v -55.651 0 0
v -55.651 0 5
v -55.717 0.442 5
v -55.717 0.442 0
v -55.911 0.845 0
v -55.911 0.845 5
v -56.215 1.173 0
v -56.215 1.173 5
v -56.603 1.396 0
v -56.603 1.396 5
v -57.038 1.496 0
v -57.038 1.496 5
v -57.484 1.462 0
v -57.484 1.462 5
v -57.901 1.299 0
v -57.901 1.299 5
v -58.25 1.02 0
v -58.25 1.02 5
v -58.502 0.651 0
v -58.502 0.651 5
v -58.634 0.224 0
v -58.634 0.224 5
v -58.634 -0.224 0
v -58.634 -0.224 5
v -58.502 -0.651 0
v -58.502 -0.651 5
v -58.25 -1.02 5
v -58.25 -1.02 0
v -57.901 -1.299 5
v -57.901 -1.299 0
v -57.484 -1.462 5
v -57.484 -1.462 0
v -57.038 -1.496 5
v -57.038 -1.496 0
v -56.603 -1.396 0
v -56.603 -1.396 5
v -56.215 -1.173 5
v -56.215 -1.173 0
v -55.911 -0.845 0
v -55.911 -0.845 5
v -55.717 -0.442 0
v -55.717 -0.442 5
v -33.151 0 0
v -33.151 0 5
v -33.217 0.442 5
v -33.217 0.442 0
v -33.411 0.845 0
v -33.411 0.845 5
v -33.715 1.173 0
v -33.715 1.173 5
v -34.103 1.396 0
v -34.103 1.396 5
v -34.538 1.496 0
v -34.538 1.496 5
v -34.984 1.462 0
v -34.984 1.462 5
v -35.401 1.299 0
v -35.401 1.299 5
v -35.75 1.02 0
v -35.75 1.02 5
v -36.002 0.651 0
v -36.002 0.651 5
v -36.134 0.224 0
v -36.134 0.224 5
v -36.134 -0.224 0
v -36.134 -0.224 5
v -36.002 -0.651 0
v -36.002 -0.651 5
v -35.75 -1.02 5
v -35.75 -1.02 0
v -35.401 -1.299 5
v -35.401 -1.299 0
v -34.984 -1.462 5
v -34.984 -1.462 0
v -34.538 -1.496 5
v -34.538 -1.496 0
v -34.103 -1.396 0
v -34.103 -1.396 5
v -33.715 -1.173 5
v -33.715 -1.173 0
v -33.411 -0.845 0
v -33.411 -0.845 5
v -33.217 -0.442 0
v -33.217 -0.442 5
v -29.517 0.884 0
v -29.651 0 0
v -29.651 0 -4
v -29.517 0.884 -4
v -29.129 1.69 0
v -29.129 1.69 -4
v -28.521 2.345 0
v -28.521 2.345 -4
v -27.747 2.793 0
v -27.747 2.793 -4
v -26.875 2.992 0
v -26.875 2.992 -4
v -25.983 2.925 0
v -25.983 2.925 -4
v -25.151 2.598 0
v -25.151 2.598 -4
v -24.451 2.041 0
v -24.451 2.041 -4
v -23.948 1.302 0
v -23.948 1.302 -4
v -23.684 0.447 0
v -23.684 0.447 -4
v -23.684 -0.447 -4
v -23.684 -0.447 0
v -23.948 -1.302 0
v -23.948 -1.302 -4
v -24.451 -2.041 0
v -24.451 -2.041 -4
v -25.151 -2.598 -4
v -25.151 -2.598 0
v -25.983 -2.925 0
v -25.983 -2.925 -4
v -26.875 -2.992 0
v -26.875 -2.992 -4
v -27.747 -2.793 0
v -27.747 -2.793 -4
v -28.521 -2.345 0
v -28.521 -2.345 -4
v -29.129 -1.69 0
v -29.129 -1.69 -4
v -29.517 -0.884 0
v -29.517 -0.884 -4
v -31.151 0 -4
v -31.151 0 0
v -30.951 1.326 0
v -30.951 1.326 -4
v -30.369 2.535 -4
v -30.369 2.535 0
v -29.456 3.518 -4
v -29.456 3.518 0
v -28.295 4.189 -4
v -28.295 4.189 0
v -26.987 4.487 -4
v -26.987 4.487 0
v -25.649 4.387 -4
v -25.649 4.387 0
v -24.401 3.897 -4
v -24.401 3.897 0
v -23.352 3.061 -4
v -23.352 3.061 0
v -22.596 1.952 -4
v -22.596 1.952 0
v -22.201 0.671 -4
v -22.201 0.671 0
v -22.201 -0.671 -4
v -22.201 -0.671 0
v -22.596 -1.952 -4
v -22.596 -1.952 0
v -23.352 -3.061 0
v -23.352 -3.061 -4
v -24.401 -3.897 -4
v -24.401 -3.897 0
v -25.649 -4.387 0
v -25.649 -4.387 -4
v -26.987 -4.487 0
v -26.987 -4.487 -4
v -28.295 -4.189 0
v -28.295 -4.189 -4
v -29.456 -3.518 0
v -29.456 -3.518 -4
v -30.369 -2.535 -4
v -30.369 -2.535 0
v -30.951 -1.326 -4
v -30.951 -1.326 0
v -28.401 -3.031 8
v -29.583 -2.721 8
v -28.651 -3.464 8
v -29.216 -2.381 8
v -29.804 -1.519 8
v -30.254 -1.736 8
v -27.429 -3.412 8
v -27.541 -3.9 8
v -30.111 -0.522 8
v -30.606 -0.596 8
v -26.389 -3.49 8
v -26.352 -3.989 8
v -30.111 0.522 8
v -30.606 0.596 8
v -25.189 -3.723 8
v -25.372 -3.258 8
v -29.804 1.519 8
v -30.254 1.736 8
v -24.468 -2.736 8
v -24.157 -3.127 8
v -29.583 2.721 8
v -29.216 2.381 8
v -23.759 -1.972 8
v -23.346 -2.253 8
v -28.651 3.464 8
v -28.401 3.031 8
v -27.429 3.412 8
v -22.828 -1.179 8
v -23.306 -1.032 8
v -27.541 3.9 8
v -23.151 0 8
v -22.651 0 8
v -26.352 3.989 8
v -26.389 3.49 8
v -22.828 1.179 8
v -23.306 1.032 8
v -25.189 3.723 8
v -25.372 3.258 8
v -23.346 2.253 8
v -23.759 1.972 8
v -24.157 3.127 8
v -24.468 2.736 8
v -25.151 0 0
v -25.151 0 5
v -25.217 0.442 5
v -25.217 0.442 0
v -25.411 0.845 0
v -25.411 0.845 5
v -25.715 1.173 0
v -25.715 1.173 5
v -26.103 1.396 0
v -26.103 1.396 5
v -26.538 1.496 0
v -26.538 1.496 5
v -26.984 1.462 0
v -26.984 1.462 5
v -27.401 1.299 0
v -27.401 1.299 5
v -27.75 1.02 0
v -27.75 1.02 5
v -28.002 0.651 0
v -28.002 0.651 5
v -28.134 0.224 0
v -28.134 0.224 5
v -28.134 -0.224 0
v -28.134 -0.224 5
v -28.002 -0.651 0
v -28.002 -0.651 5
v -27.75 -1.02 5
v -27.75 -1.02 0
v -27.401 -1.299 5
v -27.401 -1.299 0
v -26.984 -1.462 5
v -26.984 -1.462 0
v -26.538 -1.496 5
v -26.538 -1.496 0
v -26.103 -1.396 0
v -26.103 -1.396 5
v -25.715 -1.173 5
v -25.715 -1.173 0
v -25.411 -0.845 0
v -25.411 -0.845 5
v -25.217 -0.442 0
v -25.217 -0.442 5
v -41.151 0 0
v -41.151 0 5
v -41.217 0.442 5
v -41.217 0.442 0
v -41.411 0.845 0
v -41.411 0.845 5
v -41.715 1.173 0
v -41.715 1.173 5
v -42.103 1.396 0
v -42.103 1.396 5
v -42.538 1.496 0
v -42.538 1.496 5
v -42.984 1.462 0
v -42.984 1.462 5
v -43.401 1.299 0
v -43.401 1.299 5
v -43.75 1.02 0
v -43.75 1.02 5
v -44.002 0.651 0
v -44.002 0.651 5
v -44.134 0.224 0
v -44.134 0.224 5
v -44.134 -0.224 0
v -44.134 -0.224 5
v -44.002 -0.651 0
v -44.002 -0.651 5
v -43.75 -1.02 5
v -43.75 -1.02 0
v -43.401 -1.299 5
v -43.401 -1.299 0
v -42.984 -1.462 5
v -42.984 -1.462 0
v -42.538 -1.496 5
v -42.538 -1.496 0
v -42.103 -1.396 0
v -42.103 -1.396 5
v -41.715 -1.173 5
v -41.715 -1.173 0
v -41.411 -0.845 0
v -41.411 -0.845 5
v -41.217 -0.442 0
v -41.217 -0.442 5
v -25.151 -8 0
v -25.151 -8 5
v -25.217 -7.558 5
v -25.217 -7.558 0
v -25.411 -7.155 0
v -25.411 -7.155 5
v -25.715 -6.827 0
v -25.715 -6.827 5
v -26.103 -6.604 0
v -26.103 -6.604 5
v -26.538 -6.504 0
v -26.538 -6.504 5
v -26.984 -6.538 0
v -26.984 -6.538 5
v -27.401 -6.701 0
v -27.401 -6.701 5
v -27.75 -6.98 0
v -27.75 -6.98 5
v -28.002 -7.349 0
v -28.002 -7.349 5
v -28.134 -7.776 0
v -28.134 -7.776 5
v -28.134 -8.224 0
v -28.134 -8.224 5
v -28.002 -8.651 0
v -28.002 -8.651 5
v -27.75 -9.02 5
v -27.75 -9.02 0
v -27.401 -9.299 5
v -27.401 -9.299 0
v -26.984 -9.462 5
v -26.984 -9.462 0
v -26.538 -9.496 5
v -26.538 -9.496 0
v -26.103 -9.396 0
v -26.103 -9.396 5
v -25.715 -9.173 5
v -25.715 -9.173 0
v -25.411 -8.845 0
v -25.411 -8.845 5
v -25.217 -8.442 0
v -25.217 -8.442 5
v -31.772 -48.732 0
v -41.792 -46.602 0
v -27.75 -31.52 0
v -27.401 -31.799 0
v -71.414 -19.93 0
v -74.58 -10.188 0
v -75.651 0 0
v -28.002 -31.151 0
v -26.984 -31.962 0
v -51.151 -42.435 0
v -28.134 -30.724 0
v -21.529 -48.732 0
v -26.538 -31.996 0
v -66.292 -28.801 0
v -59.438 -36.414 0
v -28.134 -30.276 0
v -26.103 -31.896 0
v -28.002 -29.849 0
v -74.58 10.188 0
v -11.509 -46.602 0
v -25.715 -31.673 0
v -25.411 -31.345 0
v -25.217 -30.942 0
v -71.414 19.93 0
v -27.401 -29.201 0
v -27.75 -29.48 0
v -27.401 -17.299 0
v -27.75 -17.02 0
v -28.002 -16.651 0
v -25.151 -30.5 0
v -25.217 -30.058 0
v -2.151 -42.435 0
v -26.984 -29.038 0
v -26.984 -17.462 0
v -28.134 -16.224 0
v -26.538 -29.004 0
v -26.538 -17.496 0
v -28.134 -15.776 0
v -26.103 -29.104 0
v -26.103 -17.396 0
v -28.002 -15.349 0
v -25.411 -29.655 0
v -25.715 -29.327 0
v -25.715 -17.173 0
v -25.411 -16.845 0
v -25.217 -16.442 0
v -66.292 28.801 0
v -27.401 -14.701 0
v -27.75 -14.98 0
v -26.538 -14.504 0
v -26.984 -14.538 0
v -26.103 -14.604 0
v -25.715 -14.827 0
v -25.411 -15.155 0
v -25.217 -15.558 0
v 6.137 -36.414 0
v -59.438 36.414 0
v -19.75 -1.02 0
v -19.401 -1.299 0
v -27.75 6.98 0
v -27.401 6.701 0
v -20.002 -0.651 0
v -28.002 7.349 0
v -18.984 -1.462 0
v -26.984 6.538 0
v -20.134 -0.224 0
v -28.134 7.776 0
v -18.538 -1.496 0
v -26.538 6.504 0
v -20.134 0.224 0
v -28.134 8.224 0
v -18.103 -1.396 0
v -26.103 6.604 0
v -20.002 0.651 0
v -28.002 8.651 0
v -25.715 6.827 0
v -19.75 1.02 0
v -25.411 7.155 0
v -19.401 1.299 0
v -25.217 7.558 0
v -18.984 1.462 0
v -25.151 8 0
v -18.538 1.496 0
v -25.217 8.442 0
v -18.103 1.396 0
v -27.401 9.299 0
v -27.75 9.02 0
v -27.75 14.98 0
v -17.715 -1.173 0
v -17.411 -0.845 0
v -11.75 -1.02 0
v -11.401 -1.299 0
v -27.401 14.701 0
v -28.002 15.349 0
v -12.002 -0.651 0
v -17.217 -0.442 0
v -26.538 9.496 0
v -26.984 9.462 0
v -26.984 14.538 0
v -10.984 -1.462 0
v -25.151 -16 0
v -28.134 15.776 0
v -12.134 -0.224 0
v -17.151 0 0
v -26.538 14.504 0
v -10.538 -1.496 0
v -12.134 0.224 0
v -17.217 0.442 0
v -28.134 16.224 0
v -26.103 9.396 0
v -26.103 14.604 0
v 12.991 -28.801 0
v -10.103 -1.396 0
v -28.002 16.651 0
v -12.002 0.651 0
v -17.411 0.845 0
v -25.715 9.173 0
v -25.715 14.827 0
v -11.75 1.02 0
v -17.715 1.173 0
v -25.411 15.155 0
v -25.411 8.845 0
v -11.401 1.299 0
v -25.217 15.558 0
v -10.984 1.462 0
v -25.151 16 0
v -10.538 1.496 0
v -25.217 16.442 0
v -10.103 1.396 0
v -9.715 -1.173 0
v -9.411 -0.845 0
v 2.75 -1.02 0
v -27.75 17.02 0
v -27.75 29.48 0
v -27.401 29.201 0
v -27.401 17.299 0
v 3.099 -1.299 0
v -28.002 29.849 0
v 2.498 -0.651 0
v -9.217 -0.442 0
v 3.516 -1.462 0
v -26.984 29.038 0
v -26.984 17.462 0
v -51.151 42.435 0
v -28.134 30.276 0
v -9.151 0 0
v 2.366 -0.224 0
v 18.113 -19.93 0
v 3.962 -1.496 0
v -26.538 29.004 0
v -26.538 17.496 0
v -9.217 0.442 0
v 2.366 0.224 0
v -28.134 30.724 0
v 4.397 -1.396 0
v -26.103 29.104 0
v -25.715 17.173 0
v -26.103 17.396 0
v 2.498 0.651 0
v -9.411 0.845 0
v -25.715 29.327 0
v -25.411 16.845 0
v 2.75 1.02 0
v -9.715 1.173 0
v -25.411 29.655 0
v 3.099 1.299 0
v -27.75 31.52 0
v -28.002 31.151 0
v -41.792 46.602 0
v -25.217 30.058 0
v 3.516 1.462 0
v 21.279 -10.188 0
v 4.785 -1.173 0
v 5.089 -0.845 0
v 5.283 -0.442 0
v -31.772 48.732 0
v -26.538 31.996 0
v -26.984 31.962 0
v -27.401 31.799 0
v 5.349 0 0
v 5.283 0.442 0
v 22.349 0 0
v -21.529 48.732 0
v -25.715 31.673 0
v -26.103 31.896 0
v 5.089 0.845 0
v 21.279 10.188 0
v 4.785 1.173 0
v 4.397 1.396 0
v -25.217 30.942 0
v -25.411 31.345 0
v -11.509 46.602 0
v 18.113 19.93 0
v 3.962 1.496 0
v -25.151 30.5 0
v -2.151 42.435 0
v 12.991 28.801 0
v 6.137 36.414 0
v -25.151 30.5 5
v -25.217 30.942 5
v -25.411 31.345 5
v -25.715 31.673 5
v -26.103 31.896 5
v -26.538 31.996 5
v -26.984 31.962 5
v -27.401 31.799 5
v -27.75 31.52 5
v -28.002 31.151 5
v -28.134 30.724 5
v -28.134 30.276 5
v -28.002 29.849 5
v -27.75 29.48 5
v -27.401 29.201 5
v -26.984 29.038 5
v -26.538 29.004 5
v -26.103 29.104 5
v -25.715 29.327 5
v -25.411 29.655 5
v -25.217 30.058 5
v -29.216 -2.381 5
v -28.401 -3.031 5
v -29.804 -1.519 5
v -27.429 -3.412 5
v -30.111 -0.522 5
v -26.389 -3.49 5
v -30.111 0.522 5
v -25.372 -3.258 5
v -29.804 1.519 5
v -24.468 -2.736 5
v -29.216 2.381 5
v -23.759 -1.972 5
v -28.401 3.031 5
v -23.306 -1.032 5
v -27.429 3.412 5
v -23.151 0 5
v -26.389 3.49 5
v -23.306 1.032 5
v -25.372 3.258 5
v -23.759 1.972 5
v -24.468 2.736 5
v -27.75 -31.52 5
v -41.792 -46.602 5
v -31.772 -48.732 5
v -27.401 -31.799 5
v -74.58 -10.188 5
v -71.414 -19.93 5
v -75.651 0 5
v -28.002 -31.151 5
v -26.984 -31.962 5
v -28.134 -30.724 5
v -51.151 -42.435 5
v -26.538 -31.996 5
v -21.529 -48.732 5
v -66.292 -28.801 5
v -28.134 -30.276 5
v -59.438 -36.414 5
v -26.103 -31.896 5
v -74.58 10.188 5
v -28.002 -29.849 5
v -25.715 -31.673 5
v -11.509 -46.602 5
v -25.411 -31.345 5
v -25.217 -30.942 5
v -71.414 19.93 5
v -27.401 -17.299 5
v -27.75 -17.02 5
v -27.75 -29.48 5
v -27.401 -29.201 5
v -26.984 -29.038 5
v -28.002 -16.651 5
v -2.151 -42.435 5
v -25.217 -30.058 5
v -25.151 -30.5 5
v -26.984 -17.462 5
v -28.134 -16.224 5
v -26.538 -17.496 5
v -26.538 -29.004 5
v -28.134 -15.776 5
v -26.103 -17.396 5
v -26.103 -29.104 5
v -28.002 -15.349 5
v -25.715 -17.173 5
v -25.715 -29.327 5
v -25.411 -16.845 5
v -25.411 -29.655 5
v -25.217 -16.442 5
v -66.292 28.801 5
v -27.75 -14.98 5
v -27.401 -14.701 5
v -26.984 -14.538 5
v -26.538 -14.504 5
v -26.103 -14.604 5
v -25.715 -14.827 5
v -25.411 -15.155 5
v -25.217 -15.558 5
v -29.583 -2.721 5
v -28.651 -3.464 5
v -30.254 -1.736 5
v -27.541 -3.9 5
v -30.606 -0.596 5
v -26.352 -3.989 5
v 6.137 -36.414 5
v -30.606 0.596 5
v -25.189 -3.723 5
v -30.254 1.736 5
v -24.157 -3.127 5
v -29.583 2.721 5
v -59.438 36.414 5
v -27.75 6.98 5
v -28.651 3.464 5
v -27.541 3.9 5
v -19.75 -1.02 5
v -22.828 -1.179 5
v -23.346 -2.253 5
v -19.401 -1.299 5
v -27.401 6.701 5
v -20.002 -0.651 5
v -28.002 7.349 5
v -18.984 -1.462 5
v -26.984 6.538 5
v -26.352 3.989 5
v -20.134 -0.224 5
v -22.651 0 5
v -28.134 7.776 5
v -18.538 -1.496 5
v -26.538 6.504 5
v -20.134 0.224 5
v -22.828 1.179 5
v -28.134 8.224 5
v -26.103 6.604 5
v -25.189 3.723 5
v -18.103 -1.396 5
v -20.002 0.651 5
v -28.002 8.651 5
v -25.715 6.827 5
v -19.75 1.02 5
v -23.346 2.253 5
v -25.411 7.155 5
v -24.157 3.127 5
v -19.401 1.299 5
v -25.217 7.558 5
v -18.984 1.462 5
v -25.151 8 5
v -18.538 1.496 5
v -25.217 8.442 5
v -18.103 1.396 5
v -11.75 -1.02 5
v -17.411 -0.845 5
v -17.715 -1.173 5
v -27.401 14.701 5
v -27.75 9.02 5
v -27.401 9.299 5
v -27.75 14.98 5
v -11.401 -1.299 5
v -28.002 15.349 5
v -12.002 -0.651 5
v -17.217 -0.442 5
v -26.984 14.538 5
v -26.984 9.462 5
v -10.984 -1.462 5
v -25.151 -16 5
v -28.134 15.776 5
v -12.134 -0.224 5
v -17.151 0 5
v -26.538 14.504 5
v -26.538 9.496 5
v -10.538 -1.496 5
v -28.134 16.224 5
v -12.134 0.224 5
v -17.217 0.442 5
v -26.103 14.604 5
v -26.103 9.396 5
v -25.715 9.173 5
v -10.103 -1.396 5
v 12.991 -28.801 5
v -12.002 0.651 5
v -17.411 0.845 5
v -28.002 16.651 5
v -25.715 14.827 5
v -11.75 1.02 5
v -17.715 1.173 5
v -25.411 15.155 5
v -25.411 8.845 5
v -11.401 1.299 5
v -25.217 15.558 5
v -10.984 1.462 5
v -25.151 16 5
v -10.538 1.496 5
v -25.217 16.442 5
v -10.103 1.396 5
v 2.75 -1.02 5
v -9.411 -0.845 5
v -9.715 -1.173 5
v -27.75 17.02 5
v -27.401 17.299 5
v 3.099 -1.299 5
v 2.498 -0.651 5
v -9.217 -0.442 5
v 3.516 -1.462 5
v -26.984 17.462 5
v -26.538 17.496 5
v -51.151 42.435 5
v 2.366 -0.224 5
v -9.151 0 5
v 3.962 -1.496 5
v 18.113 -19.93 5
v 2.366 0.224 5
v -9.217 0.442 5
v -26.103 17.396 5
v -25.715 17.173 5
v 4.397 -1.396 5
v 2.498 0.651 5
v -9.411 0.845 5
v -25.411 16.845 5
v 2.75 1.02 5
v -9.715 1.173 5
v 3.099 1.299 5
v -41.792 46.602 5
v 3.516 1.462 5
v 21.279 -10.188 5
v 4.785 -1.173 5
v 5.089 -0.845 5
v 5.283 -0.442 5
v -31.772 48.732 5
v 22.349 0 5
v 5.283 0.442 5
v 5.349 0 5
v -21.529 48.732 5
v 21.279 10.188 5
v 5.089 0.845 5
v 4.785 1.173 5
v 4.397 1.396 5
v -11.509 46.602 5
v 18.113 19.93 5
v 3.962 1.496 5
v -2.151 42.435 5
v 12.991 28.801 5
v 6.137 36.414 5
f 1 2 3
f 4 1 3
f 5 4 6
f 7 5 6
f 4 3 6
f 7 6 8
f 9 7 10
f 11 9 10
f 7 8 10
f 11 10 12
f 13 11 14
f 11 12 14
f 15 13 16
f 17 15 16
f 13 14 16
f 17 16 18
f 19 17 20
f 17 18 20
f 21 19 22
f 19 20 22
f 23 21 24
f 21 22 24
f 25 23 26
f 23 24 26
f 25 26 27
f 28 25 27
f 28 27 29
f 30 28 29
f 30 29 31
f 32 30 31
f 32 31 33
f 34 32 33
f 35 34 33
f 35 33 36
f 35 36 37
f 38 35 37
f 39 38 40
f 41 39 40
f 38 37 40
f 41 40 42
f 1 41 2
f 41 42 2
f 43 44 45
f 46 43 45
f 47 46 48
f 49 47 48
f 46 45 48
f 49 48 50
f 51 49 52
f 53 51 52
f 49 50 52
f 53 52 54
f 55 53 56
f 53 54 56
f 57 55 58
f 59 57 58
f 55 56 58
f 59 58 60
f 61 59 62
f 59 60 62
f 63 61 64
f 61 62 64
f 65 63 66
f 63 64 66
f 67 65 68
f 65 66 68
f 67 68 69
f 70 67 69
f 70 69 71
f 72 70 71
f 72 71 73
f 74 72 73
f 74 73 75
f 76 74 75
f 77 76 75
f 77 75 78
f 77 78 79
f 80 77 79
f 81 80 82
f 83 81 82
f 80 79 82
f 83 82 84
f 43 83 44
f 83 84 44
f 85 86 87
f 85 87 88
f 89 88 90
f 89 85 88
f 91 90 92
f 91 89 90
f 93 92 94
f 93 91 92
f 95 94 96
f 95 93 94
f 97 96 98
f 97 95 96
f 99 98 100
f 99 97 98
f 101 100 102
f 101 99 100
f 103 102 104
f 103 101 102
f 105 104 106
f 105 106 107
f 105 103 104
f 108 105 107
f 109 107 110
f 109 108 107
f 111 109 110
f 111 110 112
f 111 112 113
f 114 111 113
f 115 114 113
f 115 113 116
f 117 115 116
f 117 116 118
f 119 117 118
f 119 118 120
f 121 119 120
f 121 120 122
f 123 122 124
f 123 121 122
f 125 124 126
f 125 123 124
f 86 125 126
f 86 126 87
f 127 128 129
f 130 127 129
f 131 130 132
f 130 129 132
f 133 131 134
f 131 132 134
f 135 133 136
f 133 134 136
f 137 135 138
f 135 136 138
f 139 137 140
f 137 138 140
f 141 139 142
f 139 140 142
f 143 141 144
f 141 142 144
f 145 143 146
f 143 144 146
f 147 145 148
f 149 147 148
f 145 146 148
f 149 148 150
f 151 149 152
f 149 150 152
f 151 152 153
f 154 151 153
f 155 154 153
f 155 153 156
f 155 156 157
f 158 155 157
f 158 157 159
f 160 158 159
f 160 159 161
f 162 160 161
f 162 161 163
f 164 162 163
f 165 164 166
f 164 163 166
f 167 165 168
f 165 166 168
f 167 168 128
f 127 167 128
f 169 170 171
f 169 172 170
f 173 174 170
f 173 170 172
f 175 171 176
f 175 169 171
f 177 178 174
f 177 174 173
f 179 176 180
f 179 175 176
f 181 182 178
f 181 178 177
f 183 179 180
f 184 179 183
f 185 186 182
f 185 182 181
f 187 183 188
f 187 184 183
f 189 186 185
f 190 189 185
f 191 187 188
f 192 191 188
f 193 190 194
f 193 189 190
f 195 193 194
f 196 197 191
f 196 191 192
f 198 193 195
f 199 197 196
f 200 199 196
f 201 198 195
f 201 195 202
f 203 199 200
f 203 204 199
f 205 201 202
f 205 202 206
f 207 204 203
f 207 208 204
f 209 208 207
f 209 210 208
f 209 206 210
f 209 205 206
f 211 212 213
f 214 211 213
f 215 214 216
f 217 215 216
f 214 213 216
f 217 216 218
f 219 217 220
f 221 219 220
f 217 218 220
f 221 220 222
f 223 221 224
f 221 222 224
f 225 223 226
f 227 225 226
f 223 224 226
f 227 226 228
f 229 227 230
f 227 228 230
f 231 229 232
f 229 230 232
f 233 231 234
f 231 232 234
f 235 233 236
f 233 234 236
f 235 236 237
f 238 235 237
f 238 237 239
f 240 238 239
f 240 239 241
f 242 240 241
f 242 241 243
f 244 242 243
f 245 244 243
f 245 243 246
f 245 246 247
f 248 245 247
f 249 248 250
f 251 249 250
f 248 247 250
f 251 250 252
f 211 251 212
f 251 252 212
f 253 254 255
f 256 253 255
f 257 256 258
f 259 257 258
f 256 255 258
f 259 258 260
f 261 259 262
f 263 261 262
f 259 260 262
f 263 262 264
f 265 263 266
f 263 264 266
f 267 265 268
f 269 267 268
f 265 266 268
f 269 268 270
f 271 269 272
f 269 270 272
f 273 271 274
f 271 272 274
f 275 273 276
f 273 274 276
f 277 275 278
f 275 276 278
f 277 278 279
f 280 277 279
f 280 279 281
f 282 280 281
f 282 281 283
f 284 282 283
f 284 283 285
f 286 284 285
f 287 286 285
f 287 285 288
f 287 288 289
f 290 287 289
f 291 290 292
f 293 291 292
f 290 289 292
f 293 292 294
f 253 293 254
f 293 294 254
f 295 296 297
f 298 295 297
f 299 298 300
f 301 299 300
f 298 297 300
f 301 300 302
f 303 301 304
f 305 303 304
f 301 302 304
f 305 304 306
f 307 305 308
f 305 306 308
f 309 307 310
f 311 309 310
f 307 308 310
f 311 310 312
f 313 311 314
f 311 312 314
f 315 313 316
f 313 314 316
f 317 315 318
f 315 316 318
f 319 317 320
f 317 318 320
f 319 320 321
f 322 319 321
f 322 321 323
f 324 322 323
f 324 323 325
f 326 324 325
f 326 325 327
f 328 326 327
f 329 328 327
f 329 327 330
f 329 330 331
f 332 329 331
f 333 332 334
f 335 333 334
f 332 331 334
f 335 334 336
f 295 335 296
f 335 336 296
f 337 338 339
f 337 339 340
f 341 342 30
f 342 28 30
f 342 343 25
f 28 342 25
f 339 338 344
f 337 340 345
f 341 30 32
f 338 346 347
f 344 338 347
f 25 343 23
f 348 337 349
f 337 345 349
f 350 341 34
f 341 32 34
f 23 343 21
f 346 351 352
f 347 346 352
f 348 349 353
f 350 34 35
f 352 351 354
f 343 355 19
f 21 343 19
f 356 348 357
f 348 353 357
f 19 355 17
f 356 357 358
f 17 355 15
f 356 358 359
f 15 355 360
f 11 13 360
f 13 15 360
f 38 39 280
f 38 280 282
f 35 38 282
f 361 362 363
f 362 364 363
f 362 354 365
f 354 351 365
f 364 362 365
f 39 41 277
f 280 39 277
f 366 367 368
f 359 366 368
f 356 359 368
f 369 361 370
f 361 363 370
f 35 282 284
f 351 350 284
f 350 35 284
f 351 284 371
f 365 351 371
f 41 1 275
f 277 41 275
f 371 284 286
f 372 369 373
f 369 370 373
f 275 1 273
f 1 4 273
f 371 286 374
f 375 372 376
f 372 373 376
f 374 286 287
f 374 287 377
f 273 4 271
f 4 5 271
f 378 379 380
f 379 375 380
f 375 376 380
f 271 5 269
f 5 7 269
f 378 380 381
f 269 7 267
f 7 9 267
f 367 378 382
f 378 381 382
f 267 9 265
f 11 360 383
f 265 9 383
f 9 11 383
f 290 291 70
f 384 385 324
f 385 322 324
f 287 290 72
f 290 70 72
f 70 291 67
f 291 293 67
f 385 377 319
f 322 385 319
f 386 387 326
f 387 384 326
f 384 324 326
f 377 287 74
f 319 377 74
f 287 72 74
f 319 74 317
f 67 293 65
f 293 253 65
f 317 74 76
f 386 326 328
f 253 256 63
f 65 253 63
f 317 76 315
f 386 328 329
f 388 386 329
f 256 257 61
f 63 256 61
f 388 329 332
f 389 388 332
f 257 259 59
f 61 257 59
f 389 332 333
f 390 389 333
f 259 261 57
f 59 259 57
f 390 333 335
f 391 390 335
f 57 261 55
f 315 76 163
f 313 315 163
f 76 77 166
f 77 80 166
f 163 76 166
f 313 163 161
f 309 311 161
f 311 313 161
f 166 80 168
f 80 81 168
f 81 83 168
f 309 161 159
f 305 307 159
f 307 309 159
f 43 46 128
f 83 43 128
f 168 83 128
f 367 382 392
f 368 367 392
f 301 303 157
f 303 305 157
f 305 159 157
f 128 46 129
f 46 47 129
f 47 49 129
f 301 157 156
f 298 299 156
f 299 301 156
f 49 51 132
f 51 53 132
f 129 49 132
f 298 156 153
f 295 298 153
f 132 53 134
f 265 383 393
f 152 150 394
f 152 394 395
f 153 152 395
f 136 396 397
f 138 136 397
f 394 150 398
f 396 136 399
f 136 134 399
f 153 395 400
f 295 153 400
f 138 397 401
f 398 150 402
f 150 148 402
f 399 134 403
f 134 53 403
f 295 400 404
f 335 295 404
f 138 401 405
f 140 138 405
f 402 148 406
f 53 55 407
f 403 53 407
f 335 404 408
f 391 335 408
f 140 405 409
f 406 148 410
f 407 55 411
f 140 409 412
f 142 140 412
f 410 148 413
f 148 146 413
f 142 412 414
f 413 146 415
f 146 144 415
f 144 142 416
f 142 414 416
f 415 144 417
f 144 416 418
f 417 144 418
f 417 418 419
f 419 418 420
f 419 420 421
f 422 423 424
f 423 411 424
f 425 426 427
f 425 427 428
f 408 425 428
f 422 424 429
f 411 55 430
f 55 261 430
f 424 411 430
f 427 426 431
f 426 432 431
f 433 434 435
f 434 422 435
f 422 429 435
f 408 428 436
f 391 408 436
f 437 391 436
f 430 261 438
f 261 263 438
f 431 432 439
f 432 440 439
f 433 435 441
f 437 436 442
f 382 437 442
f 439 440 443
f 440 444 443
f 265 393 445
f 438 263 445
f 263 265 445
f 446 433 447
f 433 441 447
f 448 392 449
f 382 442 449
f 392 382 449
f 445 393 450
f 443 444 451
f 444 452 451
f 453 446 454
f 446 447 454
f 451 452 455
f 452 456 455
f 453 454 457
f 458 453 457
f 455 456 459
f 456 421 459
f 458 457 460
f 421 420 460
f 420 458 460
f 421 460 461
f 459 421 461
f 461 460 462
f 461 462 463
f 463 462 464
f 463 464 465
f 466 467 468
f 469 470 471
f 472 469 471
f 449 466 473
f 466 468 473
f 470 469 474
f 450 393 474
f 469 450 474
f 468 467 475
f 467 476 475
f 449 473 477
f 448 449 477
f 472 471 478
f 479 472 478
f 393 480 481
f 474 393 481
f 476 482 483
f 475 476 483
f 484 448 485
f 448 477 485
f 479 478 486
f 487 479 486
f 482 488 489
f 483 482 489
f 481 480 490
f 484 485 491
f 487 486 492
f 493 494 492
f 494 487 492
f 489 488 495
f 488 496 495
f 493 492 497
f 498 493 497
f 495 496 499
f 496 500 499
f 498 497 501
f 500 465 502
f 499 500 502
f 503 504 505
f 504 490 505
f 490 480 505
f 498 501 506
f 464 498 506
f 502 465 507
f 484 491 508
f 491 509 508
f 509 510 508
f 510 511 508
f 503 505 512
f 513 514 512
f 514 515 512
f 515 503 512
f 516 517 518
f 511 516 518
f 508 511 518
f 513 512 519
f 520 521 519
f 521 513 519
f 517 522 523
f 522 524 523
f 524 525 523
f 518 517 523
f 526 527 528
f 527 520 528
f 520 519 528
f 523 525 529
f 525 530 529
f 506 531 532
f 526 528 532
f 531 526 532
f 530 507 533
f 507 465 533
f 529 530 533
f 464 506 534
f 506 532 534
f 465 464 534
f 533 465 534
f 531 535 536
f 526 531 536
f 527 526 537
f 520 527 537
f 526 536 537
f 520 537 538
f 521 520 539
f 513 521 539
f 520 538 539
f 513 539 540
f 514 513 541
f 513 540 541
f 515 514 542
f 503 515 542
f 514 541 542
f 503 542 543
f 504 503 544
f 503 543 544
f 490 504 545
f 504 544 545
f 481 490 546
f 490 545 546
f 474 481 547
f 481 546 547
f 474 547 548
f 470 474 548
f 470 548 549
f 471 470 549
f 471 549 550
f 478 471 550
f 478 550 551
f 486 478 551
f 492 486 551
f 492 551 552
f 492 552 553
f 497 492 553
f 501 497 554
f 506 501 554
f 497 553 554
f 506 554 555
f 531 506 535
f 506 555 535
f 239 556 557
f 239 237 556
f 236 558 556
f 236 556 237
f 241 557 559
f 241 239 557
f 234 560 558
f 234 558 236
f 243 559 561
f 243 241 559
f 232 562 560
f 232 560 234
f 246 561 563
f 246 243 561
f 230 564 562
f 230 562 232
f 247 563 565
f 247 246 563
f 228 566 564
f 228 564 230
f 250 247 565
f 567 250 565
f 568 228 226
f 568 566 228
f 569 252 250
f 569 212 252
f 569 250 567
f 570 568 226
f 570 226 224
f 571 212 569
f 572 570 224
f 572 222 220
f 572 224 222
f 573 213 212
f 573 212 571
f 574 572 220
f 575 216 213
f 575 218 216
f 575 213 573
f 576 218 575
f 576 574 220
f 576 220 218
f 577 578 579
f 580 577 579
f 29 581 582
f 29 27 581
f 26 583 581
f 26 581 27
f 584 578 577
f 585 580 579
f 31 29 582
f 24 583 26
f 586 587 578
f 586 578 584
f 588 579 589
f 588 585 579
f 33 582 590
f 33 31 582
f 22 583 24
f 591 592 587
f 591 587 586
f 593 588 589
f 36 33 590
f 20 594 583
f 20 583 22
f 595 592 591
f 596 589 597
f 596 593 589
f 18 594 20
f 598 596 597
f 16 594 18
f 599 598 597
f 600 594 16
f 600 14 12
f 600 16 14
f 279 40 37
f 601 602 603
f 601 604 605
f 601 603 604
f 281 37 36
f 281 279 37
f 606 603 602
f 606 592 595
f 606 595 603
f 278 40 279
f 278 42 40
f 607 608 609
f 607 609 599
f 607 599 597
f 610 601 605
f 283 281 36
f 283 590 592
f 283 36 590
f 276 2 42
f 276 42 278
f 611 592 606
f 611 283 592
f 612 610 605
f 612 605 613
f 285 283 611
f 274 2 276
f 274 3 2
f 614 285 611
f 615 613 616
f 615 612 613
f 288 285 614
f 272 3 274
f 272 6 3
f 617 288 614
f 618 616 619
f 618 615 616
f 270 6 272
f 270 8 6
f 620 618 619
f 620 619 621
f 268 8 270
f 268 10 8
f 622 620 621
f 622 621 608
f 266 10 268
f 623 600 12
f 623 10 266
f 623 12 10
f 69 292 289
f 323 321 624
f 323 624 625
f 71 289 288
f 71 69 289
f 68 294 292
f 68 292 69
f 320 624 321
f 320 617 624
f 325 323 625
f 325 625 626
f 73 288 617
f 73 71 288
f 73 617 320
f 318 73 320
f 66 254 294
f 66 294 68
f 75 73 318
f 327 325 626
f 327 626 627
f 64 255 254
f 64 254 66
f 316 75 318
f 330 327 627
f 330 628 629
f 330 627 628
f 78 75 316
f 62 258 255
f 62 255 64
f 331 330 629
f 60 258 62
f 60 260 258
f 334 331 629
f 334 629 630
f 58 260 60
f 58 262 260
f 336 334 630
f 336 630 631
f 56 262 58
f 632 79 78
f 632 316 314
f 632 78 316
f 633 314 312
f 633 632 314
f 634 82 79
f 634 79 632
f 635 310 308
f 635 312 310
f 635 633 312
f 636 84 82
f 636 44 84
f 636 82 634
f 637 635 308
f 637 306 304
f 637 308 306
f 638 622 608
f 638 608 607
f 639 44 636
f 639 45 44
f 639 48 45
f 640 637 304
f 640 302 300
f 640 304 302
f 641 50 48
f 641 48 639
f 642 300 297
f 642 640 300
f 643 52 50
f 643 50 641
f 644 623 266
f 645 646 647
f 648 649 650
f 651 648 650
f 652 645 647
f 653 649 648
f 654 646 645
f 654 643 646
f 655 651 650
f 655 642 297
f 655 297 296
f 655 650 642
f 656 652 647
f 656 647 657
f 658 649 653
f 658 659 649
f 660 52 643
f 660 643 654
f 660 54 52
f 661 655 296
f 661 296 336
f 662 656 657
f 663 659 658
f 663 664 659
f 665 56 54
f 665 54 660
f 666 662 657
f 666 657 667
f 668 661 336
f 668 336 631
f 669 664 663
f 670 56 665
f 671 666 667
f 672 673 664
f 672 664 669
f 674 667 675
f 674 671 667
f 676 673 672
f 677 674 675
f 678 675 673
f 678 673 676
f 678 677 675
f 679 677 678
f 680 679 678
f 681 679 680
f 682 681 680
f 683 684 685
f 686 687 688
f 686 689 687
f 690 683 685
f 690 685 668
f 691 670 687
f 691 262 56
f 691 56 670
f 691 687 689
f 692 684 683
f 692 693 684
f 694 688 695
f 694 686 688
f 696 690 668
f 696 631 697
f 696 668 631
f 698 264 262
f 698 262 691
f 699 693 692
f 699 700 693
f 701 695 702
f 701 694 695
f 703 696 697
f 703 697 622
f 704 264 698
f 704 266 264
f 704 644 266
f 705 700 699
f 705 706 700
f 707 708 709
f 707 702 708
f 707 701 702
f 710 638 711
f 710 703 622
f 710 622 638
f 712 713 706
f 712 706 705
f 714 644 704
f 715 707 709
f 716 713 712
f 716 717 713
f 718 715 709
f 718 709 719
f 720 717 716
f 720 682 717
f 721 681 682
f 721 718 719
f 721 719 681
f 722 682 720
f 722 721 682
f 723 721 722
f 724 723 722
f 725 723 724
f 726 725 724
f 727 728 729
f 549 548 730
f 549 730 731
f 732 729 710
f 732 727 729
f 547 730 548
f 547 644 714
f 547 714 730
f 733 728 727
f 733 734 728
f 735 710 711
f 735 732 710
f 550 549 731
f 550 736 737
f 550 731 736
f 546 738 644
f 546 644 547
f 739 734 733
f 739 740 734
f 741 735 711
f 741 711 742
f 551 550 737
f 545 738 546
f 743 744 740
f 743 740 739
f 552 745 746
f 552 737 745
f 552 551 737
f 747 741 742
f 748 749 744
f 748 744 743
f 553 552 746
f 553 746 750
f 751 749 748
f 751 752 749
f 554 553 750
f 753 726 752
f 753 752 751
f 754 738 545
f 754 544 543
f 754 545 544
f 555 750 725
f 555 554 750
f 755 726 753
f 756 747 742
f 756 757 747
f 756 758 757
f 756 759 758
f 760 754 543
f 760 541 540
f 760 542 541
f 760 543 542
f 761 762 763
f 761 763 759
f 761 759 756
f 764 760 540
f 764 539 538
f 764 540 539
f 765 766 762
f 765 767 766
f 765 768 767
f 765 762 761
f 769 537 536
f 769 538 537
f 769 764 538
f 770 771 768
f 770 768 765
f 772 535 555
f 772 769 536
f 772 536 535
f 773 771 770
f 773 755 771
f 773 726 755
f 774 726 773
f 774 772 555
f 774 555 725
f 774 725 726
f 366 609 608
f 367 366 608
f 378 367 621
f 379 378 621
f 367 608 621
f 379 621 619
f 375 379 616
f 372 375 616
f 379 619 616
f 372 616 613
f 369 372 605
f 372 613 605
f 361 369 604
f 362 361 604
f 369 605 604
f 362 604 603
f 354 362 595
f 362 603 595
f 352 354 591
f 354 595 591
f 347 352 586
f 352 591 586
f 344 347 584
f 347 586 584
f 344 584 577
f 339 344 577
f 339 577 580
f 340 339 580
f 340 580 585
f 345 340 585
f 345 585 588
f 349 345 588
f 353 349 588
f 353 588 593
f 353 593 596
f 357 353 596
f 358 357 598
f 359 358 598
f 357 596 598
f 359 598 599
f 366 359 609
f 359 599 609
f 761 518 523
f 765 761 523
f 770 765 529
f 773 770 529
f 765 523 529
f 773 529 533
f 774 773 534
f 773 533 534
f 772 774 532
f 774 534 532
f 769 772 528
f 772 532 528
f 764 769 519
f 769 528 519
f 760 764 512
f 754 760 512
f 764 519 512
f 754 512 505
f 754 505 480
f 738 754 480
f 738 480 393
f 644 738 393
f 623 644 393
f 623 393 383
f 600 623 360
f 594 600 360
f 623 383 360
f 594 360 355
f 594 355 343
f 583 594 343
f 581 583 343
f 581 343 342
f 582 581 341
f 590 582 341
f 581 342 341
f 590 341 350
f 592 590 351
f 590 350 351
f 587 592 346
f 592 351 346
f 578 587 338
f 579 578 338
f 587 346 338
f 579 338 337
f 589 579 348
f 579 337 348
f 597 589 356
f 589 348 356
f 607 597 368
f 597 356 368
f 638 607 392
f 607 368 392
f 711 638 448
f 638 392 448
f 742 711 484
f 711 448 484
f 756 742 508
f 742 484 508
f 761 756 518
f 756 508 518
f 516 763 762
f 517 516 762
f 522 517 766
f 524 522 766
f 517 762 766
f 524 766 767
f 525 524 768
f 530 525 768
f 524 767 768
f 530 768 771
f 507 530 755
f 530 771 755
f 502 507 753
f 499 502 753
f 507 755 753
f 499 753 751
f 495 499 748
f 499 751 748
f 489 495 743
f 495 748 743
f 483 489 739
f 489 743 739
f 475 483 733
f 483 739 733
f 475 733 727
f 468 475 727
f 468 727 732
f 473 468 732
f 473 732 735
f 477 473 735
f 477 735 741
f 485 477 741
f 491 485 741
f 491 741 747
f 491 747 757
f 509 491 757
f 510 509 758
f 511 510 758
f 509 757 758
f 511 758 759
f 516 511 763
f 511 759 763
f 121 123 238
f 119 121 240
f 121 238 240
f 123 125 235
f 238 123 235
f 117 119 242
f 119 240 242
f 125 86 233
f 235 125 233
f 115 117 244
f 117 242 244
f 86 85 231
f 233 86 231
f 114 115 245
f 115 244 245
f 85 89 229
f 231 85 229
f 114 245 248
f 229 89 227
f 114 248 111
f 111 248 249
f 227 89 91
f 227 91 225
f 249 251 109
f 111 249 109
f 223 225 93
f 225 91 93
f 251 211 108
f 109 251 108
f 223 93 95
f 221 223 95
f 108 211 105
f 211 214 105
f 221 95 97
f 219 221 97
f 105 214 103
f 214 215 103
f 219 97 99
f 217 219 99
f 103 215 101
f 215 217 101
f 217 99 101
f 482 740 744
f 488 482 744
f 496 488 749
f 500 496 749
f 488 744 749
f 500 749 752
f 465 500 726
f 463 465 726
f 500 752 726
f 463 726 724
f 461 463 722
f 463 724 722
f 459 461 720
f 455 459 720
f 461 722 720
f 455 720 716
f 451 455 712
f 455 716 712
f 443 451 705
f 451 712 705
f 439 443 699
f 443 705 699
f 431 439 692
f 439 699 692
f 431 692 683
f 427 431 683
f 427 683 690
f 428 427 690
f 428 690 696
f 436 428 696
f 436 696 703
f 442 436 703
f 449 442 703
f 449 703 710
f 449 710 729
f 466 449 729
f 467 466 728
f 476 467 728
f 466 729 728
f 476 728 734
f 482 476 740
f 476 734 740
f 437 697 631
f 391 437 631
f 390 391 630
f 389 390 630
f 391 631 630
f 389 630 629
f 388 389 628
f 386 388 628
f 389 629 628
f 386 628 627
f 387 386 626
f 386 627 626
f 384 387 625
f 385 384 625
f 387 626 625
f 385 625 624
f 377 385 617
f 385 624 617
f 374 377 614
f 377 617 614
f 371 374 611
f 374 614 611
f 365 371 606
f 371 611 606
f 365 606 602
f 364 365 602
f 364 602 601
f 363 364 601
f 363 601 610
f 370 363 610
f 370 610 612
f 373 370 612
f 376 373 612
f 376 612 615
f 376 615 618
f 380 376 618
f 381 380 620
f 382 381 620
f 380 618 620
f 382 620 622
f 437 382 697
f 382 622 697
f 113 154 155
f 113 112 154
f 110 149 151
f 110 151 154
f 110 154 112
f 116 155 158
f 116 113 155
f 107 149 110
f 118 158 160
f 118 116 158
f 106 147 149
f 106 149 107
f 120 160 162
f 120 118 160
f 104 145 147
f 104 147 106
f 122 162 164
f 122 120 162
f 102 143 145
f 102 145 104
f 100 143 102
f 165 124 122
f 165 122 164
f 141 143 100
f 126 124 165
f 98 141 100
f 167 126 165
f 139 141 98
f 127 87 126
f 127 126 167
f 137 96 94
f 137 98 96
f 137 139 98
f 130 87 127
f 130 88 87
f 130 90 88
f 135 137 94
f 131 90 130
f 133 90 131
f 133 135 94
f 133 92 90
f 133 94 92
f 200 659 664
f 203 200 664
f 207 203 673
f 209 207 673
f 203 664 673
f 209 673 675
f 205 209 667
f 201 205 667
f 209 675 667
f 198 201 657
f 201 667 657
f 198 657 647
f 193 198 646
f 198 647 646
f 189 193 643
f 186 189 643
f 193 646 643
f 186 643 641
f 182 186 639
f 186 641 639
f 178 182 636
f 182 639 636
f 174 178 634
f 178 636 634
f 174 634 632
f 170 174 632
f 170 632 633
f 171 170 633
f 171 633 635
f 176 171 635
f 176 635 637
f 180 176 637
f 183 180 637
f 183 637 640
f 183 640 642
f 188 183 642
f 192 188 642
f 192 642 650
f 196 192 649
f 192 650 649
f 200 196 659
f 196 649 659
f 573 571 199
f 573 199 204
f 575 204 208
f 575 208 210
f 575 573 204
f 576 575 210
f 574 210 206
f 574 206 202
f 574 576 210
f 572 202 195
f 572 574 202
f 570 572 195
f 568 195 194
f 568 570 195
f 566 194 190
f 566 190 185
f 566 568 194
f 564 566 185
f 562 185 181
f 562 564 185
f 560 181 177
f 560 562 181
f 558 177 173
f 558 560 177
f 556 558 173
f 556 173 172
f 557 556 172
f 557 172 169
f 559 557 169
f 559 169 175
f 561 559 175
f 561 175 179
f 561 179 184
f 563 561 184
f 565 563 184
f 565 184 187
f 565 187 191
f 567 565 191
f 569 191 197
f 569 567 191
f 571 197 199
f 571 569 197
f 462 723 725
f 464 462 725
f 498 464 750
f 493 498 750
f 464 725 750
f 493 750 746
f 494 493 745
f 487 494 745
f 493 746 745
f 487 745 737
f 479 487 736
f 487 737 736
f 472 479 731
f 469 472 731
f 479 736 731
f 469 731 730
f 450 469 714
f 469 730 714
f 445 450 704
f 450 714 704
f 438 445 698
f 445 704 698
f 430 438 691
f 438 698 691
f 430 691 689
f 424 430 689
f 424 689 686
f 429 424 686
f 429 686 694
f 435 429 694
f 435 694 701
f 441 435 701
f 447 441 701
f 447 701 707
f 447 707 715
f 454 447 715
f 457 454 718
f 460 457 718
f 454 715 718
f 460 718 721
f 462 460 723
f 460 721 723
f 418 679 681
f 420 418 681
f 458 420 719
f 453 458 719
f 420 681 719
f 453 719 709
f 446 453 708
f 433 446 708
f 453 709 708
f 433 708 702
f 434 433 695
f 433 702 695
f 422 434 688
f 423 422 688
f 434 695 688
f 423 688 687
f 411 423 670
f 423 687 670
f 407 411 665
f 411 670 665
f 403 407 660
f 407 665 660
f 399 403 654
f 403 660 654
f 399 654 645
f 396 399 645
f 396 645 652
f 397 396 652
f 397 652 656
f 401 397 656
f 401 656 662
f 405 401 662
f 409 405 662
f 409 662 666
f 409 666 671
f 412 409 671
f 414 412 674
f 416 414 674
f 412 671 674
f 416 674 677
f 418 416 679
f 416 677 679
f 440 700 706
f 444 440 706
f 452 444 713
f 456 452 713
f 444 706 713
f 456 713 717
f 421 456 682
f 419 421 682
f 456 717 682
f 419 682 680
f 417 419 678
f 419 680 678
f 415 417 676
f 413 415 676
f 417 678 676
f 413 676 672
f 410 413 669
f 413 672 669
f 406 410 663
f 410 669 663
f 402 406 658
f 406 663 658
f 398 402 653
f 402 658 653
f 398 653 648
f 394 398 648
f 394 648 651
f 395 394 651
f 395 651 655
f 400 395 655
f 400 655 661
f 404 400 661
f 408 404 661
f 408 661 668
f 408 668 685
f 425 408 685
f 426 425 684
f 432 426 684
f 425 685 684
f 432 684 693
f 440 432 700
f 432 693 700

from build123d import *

# Parameters (mm, degrees)
SKETCH1_R           = 49
BOSS_EXTRUDE1_DEPTH = 5
SKETCH2_R           = 4.5
SKETCH2_R_2         = 3
BOSS_EXTRUDE2_DEPTH = 4
SKETCH2_2_R         = 4.5
SKETCH2_2_R_2       = 3
BOSS_EXTRUDE3_DEPTH = 4
SKETCH3_R           = 4
SKETCH3_R_2         = 3.5
BOSS_EXTRUDE4_DEPTH = 3
SKETCH4_R           = 1.5
CUT_EXTRUDE1_DEPTH  = 5
SKETCH5_R           = 1.5
CUT_EXTRUDE2_DEPTH  = 5


with BuildPart() as part:
    # Sketch1 → Boss-Extrude1 (new body)
    with BuildSketch(Plane.XY):
        with Locations((-26.650582962, 0)):
            Circle(SKETCH1_R)
    extrude(amount=BOSS_EXTRUDE1_DEPTH)

    # Sketch2 → Boss-Extrude2 (add)
    with BuildSketch(Plane(origin=(0, 0, 0), x_dir=(-1, 0, 0), z_dir=(0, 0, -1))):
        with Locations((26.650582962, 0)):
            Circle(SKETCH2_R)
        with Locations((26.650582962, 0)):
            Circle(SKETCH2_R_2, mode=Mode.SUBTRACT)
    extrude(amount=-BOSS_EXTRUDE2_DEPTH)

    # Sketch2<2> → Boss-Extrude3 (add)
    with BuildSketch(Plane(origin=(0, 0, 0), x_dir=(-1, 0, 0), z_dir=(0, 0, -1))):
        with Locations((26.650582962, 0)):
            Circle(SKETCH2_2_R)
        with Locations((26.650582962, 0)):
            Circle(SKETCH2_2_R_2, mode=Mode.SUBTRACT)
    extrude(amount=BOSS_EXTRUDE3_DEPTH)

    # Sketch3 → Boss-Extrude4 (add)
    with BuildSketch(Plane.XY.offset(5)):
        with Locations((-26.650582962, 0)):
            Circle(SKETCH3_R)
        with Locations((-26.650582962, 0)):
            Circle(SKETCH3_R_2, mode=Mode.SUBTRACT)
    extrude(amount=BOSS_EXTRUDE4_DEPTH)

    # Sketch4 → Cut-Extrude1 (cut)
    with BuildSketch(Plane.XY.offset(5)):
        with Locations((-26.650582962, 0)):
            Circle(SKETCH4_R)
    extrude(amount=-CUT_EXTRUDE1_DEPTH, mode=Mode.SUBTRACT)

    # Sketch5 → Cut-Extrude2 (cut)
    with BuildSketch(Plane.XY.offset(5)):
        with Locations((-34.650582962, 0)):
            Circle(SKETCH5_R)
        with Locations((-42.650582962, 0)):
            Circle(SKETCH5_R)
        with Locations((-57.150582962, 0)):
            Circle(SKETCH5_R)
        with Locations((-26.650582962, 8)):
            Circle(SKETCH5_R)
        with Locations((-26.650582962, 16)):
            Circle(SKETCH5_R)
        with Locations((-26.650582962, 30.5)):
            Circle(SKETCH5_R)
        with Locations((-18.650582962, 0)):
            Circle(SKETCH5_R)
        with Locations((-10.650582962, 0)):
            Circle(SKETCH5_R)
        with Locations((3.849417038, 0)):
            Circle(SKETCH5_R)
        with Locations((-26.650582962, -8)):
            Circle(SKETCH5_R)
        with Locations((-26.650582962, -16)):
            Circle(SKETCH5_R)
        with Locations((-26.650582962, -30.5)):
            Circle(SKETCH5_R)
    extrude(amount=-CUT_EXTRUDE2_DEPTH, mode=Mode.SUBTRACT)


solid = part.part
